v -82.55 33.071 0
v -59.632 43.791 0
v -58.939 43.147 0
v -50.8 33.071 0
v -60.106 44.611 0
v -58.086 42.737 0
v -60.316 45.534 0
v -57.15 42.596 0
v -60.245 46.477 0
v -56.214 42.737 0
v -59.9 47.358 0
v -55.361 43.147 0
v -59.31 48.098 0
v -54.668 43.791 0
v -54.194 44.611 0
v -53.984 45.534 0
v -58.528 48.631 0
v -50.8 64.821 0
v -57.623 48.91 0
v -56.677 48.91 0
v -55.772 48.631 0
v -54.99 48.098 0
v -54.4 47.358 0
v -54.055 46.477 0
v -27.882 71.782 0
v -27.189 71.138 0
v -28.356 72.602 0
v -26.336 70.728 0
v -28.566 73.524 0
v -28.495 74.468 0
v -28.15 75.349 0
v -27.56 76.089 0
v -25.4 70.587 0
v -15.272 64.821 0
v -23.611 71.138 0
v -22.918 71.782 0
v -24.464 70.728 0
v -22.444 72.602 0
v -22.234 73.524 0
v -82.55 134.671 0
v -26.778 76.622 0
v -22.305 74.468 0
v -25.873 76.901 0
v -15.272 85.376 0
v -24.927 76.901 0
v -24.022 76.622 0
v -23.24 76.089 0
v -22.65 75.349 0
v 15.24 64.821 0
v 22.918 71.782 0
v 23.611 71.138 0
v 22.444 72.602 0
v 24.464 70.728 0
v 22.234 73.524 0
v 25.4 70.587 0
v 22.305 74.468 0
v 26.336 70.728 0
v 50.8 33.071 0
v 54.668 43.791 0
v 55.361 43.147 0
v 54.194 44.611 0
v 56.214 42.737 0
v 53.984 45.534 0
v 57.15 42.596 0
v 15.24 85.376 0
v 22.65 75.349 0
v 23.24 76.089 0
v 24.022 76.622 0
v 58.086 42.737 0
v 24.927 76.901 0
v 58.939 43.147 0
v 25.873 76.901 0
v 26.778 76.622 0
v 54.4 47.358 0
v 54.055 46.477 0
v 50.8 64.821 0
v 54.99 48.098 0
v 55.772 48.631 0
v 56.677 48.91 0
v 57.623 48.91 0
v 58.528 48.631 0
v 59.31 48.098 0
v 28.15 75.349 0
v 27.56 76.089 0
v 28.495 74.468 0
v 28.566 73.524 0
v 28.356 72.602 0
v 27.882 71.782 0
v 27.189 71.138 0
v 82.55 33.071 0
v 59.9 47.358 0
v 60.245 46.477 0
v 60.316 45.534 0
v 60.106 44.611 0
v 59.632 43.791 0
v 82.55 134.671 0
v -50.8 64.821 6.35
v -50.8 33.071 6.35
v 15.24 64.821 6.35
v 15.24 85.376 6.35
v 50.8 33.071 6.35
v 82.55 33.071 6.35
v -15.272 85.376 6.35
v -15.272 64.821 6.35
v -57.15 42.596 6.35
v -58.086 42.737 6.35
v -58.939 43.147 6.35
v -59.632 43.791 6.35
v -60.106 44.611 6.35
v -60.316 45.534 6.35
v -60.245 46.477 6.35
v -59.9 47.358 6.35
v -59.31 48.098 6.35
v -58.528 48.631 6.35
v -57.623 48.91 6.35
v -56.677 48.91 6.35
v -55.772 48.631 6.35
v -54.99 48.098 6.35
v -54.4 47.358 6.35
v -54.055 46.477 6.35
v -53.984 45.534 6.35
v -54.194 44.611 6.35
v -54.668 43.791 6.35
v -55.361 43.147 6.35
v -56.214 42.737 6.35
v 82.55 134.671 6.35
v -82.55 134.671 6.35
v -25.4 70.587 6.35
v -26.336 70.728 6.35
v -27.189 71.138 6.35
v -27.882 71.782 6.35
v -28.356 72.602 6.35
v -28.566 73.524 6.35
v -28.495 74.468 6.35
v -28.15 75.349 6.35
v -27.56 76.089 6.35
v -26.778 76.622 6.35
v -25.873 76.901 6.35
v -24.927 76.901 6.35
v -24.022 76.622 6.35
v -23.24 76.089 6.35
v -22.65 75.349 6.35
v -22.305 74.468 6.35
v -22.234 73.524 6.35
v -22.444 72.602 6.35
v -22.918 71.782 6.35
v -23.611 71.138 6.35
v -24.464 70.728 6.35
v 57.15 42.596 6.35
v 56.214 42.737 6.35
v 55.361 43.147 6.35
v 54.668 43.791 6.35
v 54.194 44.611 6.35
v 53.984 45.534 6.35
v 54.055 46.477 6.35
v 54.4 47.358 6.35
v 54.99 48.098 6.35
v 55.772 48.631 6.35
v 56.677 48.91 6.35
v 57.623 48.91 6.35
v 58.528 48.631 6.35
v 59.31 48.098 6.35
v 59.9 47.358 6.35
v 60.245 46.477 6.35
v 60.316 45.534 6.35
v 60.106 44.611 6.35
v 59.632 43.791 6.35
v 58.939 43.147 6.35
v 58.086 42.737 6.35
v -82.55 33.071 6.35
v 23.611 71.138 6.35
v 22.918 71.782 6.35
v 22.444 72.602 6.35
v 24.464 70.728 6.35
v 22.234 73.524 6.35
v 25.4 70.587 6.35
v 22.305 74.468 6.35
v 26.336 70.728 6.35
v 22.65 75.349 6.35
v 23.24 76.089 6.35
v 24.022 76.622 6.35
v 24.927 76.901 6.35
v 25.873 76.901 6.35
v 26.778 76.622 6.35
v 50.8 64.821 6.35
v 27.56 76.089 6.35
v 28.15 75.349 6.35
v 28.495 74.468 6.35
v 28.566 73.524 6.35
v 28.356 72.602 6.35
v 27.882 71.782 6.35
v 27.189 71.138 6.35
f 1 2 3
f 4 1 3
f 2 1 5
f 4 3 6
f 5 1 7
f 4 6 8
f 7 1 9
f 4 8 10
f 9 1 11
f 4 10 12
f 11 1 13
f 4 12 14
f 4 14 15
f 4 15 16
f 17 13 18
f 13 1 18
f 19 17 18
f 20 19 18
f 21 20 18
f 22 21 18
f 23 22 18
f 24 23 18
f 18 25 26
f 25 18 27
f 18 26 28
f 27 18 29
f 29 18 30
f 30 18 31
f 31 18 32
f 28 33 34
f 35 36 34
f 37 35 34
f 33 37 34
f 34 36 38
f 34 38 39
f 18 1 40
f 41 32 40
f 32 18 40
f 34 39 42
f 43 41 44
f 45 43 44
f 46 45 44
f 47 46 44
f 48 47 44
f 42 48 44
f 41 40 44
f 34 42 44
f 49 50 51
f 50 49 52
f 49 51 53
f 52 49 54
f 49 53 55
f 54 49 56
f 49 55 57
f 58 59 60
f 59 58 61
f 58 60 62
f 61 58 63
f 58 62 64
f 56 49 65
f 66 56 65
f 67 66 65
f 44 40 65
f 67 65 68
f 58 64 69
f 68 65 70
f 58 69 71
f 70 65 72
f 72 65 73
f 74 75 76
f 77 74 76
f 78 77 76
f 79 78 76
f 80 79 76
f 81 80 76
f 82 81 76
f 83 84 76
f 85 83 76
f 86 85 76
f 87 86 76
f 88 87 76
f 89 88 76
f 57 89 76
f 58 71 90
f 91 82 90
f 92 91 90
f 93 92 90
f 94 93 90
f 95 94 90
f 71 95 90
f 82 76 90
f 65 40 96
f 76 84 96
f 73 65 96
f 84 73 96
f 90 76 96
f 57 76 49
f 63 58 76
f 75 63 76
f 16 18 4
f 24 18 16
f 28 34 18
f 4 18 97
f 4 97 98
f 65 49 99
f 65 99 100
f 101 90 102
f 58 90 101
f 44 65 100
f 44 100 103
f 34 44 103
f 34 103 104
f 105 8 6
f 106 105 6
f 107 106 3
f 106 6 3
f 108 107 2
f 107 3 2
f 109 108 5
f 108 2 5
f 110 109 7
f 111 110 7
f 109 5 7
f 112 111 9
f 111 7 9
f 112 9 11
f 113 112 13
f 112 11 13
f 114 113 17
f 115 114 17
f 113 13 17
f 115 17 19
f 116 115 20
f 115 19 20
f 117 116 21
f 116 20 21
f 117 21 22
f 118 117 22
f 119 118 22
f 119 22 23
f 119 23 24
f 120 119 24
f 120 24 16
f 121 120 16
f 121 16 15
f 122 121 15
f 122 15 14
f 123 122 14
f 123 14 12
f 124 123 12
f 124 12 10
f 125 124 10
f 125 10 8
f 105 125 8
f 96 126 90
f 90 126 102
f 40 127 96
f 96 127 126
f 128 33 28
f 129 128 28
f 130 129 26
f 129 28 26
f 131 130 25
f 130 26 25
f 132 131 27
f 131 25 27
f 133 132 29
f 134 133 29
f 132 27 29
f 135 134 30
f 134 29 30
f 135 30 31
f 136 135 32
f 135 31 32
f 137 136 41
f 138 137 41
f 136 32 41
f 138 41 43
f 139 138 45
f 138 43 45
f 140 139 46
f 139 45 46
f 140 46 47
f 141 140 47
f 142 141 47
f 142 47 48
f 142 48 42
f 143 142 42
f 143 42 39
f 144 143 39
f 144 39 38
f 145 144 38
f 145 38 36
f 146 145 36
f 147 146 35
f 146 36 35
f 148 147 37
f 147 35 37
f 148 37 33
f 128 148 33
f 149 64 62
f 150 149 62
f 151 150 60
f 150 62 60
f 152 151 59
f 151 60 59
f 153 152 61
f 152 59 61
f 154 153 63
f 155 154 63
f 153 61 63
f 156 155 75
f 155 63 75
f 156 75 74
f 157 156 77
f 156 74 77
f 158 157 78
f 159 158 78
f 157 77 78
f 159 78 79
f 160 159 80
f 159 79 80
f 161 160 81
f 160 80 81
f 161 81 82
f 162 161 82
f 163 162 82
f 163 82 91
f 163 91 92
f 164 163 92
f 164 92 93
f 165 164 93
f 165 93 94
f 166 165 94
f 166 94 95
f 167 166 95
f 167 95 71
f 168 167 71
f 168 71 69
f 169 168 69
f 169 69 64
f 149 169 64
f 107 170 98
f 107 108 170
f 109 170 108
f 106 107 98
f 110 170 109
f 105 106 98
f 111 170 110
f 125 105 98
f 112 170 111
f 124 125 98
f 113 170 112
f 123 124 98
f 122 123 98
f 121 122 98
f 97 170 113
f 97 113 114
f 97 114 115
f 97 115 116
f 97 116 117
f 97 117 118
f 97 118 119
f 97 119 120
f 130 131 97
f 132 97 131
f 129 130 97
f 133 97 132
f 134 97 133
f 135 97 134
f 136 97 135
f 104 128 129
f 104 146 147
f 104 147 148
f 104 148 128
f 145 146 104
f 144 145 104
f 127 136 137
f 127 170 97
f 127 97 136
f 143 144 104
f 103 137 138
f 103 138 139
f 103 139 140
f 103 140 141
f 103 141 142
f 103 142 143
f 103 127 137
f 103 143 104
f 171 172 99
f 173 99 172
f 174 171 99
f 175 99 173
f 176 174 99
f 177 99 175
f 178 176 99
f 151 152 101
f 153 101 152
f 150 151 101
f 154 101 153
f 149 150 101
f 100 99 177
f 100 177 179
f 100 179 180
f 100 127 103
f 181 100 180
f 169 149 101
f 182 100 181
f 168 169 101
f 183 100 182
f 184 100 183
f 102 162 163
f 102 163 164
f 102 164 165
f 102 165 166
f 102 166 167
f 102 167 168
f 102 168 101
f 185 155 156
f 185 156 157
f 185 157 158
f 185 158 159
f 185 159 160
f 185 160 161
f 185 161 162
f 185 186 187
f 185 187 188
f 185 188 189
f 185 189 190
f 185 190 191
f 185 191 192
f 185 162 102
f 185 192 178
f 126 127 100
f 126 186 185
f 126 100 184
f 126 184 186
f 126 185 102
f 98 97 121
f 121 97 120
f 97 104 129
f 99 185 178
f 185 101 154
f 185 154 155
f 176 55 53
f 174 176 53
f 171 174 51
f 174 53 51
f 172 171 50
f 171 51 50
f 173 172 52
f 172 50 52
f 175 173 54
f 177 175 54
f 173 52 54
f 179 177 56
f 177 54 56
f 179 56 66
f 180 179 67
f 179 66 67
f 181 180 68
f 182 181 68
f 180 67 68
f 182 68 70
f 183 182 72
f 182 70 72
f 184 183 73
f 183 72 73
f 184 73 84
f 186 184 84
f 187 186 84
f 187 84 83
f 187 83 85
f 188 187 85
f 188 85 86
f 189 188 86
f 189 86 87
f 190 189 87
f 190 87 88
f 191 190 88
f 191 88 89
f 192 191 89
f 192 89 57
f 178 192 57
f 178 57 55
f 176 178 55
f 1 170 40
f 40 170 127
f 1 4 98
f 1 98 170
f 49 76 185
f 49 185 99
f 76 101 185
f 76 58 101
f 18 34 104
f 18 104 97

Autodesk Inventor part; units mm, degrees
ref_plane "YZ Plane" through (0, 0, 0) normal (1, 0, 0) x (0, 1, 0)
ref_plane "XZ Plane" through (0, 0, 0) normal (0, 1, 0) x (-1, 0, 0)
ref_plane "XY Plane" through (0, 0, 0) normal (0, 0, 1) x (1, 0, 0)
ref_plane "Work Plane1" through (0, 0, 0) normal (0, 0, 1) x (1, 0, 0)
sketch "Sketch2" plane through (0, 0, 0) normal (0, 0, 1) x (1, 0, 0)
  line L0 (-69.85, 121.9708) -> (69.85, 121.9708) projected
  line L1 (-69.85, 33.0708) -> (-69.85, 121.9708) projected
  line L2 (69.85, 33.0708) -> (-69.85, 33.0708) projected
  line L3 (-50.8, 64.8208) -> (-50.8, 33.0708) projected
  line L4 (50.8, 64.8208) -> (-50.8, 64.8208) projected
  line L5 (50.8, 33.0708) -> (50.8, 64.8208) projected
  line L6 (69.85, 121.9708) -> (69.85, 33.0708) projected
  line L7 (-15.2718, 85.3756) -> (-15.2718, 64.8208) projected
  line L8 (15.24, 85.3756) -> (-15.2718, 85.3756) projected
  line L9 (15.24, 64.8208) -> (15.24, 85.3756) projected
  point P0 (0, 0)
extrude "Extrusion1" add sketch "Sketch2" along normal blind 6.35 contours L0 L6 L2 L5 L4 L9 L8 L7 L3 L1
sketch "Sketch3" plane through (0, 0, 6.35) normal (0, 0, 1) x (1, 0, 0)
  circle A0 centre (-57.15, 45.7708) radius 3.5662 projected
  circle A1 centre (-25.4, 73.7616) radius 2.4892 projected
  circle A2 centre (57.15, 45.7708) radius 3.9624 projected
  point P0 (0, 0)
  point P1 (25.4, 73.7616)
  point P2 (25.4, 73.7616)
hole "Hole1" at (25.4, 73.7616, 6.35) at (-57.15, 45.7708, 6.35) at (57.15, 45.7708, 6.35) at (-25.4, 73.7616, 6.35) direction (0, 0, -1) diameter 6.35 depth 25.4 tip angle 118
sketch "Sketch5" plane through (0, 0, 6.35) normal (0, 0, 1) x (1, 0, 0)
  line L0 (-69.85, 33.0708) -> (-50.8, 33.0708) projected
  line L1 (-69.85, 33.0708) -> (-82.55, 33.0708)
  line L2 (-82.55, 33.0708) -> (-82.55, 134.6708)
  line L3 (-82.55, 134.6708) -> (-69.85, 134.6708)
  line L4 (-69.85, 134.6708) -> (-69.85, 33.0708)
  line L5 (-82.55, 134.6708) -> (82.55, 134.6708)
  line L6 (82.55, 134.6708) -> (82.55, 121.9708)
  line L7 (82.55, 121.9708) -> (-82.55, 121.9708)
  line L8 (-82.55, 121.9708) -> (-82.55, 134.6708)
  line L9 (50.8, 33.0708) -> (69.85, 33.0708) projected
  line L10 (82.55, 121.9708) -> (69.85, 121.9708)
  line L11 (69.85, 121.9708) -> (69.85, 33.0708)
  line L12 (69.85, 33.0708) -> (82.55, 33.0708)
  line L13 (82.55, 33.0708) -> (82.55, 121.9708)
  point P0 (0, 0)
  dimension "d26" = 12.7
  dimension "d27" = 12.7
  dimension "d28" = 12.7
extrude "Extrusion3" add sketch "Sketch5" against normal up to surface (6.35 mm away)
ref_plane "Work Plane2" through (0, 33.0708, 6.35) normal (-1, 0, 0) x (0, 0, 1)
equation "\"d1\" = d2"
equation "\"d2\" = 12.7"
properties part number "Hang Mount"
